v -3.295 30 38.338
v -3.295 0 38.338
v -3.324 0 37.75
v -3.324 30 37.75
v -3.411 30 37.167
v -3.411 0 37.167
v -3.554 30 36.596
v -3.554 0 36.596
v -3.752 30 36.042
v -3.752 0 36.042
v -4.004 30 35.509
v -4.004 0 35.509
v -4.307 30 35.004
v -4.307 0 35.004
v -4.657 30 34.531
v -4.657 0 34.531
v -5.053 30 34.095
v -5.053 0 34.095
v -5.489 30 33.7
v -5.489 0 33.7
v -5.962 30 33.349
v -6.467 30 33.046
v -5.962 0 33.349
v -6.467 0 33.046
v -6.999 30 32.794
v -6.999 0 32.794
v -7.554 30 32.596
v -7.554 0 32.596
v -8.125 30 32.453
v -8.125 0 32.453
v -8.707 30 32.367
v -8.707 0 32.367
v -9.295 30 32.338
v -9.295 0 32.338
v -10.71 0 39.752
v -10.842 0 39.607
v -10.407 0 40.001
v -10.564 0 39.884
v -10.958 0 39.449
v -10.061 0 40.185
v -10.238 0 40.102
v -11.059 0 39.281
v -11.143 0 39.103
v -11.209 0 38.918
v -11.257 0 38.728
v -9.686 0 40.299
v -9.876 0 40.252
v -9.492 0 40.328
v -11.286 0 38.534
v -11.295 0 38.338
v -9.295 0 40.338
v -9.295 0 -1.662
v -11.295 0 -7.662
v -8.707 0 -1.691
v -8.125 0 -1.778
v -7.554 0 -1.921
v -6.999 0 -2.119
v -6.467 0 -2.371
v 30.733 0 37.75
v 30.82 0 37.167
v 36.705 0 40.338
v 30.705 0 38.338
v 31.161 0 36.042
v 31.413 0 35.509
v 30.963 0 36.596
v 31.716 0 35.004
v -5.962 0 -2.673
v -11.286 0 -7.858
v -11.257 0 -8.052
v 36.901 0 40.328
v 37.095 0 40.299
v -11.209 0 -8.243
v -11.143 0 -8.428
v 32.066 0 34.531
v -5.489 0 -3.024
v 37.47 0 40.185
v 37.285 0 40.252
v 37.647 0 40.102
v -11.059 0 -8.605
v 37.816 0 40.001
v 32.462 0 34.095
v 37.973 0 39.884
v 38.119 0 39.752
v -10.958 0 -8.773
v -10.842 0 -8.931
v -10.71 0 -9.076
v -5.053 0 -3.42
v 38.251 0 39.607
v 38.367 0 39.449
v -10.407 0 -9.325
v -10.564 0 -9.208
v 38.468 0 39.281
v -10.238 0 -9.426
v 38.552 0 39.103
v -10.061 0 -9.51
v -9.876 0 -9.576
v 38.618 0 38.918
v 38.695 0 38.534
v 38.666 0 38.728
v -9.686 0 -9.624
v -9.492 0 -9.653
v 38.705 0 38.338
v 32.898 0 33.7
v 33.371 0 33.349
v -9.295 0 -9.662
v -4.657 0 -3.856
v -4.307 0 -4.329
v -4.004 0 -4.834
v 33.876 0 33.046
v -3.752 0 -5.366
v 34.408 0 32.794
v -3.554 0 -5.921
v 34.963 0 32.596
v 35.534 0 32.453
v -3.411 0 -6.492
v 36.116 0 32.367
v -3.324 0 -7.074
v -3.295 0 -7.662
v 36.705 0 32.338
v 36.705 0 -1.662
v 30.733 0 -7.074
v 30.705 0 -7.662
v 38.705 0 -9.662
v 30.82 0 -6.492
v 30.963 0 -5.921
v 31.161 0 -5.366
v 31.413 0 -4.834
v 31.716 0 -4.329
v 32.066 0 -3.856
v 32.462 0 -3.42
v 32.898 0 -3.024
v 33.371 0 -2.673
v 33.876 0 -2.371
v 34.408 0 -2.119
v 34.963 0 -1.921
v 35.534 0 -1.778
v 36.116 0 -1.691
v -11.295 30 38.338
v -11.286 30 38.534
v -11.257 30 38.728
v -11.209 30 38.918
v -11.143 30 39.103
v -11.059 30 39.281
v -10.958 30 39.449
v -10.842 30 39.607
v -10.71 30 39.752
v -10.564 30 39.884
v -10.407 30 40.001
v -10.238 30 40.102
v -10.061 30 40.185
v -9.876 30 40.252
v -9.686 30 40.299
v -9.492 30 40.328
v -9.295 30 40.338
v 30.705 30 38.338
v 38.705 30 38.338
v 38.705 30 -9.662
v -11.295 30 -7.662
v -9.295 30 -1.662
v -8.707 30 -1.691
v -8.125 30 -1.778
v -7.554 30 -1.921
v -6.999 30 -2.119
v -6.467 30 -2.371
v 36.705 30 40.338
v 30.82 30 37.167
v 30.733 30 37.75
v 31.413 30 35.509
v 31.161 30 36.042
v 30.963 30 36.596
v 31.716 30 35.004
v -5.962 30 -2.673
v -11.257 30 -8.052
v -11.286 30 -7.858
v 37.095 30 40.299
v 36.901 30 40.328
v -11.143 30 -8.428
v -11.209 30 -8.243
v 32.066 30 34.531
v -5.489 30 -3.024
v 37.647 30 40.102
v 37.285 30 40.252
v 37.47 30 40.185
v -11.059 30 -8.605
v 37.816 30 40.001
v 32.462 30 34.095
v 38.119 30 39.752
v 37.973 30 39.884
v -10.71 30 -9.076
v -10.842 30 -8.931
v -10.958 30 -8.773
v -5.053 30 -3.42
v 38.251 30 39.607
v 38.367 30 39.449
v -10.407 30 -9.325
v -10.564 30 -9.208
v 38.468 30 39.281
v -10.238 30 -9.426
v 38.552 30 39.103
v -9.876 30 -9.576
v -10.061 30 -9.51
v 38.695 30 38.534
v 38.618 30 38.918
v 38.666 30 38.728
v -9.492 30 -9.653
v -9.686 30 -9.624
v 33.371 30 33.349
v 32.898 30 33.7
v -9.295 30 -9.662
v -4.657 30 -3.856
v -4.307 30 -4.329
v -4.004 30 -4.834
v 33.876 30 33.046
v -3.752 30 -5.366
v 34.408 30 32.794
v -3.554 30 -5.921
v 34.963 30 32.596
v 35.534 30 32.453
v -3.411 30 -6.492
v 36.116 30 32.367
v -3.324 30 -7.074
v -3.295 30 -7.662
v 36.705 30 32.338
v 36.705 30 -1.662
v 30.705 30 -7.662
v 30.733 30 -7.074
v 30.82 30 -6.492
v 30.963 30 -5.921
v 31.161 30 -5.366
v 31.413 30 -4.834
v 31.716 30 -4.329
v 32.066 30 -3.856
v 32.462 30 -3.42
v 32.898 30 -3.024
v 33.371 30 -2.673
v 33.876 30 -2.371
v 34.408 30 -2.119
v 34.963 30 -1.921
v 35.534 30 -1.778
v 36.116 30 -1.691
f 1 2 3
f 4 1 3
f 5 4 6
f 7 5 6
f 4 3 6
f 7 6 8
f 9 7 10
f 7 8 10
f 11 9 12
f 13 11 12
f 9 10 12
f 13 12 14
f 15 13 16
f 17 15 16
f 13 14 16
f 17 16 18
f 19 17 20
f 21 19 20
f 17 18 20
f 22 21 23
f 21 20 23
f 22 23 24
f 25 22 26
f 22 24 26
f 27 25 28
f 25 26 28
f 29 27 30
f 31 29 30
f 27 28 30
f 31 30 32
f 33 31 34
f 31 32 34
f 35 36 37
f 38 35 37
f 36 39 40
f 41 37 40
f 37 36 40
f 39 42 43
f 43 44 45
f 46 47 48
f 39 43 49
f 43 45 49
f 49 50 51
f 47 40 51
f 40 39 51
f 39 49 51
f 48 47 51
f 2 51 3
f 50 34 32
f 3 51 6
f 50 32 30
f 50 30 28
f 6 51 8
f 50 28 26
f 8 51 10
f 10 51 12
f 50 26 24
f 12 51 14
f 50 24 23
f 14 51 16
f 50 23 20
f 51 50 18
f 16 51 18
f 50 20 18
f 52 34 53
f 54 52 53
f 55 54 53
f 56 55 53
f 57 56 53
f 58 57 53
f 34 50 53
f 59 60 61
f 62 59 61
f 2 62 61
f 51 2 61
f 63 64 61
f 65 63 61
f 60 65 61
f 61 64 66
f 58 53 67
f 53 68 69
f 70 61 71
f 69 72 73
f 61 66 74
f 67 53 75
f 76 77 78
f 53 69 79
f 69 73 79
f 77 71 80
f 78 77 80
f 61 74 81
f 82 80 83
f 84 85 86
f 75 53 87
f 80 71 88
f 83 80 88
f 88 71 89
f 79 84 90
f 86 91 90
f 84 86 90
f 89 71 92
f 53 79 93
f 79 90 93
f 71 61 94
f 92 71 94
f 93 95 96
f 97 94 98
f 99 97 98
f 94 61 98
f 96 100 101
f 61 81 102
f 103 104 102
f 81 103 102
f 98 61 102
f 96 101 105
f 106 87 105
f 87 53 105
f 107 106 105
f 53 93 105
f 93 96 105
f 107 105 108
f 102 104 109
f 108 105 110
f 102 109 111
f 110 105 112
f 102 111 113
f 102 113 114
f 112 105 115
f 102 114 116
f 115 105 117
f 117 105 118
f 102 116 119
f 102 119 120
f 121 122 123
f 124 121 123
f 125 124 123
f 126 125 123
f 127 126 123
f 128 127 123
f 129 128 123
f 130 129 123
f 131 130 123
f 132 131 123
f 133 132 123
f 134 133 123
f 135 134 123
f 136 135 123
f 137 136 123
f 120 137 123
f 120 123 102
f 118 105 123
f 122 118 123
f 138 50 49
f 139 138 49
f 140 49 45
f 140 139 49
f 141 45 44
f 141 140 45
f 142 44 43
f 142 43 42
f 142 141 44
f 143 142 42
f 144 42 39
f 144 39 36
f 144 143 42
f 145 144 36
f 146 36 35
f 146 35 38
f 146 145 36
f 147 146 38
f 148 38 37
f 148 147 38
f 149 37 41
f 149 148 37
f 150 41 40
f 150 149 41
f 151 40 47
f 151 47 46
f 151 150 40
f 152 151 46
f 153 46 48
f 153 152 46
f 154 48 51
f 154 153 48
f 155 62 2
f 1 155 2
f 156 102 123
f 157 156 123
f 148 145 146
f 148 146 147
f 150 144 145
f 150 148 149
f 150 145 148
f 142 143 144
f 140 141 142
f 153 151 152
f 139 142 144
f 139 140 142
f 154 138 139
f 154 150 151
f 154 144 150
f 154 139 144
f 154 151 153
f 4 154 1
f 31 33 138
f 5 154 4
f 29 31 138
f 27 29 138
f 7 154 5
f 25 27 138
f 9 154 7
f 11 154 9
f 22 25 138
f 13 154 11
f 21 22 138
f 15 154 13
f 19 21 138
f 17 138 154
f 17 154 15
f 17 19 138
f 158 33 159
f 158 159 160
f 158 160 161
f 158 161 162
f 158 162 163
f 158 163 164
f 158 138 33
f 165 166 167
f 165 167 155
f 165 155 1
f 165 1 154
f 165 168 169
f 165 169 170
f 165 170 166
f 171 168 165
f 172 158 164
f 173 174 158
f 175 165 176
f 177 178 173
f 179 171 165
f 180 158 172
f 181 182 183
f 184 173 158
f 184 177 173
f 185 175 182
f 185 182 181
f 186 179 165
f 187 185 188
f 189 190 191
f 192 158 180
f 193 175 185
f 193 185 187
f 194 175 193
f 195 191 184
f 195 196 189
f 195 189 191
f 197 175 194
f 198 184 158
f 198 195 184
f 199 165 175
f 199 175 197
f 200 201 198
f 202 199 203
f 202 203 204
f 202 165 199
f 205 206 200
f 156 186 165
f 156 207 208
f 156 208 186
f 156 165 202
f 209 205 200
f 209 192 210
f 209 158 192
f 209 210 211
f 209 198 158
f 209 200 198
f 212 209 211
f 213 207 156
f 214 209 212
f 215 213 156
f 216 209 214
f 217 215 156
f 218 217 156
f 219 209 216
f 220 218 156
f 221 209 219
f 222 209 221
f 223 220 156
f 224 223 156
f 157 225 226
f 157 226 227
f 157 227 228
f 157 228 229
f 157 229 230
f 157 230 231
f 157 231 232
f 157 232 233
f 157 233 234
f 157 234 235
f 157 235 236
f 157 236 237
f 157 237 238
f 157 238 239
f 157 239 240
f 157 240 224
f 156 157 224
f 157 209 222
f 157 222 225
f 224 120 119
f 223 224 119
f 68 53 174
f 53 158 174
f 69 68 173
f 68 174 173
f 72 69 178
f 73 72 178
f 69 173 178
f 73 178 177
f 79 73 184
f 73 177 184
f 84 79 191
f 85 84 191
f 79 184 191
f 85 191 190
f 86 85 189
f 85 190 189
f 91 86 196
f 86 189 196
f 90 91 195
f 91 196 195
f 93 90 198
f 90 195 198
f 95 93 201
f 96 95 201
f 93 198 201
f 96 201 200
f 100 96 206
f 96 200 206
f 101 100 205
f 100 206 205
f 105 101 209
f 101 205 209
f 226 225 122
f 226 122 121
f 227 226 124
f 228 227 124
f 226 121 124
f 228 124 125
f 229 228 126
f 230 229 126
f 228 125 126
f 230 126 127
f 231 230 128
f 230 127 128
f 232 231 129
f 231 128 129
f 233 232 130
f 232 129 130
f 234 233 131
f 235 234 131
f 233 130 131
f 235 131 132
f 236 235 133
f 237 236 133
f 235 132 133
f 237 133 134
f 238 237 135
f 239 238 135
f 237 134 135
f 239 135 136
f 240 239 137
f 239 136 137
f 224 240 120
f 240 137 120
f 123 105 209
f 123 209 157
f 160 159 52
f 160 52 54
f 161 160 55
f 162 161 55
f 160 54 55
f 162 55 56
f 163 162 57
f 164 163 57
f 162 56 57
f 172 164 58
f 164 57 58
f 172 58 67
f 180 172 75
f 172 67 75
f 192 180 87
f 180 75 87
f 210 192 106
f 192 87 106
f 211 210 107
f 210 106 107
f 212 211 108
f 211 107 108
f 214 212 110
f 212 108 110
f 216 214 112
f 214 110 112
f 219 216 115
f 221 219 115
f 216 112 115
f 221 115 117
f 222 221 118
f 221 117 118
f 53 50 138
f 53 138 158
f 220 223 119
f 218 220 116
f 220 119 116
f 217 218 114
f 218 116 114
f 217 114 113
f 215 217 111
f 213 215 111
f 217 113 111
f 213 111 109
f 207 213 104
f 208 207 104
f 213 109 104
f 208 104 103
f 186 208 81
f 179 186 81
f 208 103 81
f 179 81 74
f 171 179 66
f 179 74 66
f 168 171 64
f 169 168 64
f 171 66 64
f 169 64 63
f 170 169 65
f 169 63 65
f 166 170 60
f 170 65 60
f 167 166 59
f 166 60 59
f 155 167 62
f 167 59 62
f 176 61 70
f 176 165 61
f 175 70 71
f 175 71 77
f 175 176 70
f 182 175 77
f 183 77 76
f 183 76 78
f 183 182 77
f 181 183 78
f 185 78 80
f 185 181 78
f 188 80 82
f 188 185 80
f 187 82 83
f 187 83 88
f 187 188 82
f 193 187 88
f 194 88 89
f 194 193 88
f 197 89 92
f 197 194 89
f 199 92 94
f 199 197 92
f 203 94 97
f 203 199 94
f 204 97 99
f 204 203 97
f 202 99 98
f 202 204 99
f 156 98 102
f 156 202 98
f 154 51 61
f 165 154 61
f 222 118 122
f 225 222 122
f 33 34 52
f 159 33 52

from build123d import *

# Parameters (mm, degrees)
ESQUISSE1_W        = 50
ESQUISSE1_H        = 50
BOSS_EXTRU_1_DEPTH = 30
CONG_1_R           = 2


with BuildPart() as part:
    # Esquisse1 → Boss.-Extru.1 (new body)
    with BuildSketch(Plane(origin=(0, 0, 0), x_dir=(1, 0, 0), z_dir=(0, 1, 0))):
        with Locations((13.704515327, -15.337721188)):
            Rectangle(ESQUISSE1_W, ESQUISSE1_H)
        with BuildLine():
            Line((-3.295484673, 7.662278812), (30.704515327, 7.662278812))
            ThreePointArc((30.704515327, 7.662278812), (32.461874639, 3.419638124), (36.704515327, 1.662278812))
            Line((36.704515327, 1.662278812), (36.704515327, -32.337721188))
            ThreePointArc((36.704515327, -32.337721188), (32.461874639, -34.095080501), (30.704515327, -38.337721188))
            Line((30.704515327, -38.337721188), (-3.295484673, -38.337721188))
            ThreePointArc((-3.295484673, -38.337721188), (-5.052843986, -34.095080501), (-9.295484673, -32.337721188))
            Line((-9.295484673, -32.337721188), (-9.295484673, 1.662278812))
            ThreePointArc((-9.295484673, 1.662278812), (-5.052843986, 3.419638124), (-3.295484673, 7.662278812))
        make_face(mode=Mode.SUBTRACT)
    extrude(amount=BOSS_EXTRU_1_DEPTH)

    # Congé1
    cong_1_edges = [part.edges().sort_by_distance(p)[0] for p in [
        (-11.295484673, 15, -9.662278812),
        (38.704515327, 15, 40.337721188),
        (-11.295484673, 15, 40.337721188),
    ]]
    fillet(cong_1_edges, radius=CONG_1_R)


solid = part.part
